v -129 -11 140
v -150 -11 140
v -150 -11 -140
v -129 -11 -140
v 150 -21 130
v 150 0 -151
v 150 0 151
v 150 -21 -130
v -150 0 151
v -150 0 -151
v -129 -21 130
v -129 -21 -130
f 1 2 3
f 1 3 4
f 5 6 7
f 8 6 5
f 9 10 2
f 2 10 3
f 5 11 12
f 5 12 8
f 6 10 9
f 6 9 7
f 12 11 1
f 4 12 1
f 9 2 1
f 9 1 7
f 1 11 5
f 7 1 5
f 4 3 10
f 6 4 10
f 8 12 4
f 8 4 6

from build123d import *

# Parameters (mm, degrees)
F0_W     = 300
F0_H     = 302
F1_DEPTH = 21
F2_SIZE  = 20.99999
F3_W     = 21
F3_H     = 302
F4_DEPTH = 10


# Not quite as in the source:
# - a fillet or chamfer is up to 0.001 mm smaller than in the source, because OpenCascade refuses the exact size


with BuildPart() as f1:
    # F0 (on Front) → F1 (new body)
    with BuildSketch(Plane.XZ):
        Rectangle(F0_W, F0_H)
    extrude(amount=F1_DEPTH)

    # F2 (size 21 in the source; OpenCascade refuses exactly that, so slightly less here)
    f2_edges = [f1.edges().sort_by_distance(p)[0] for p in [
        (0, -21, 151),
        (0, -21, -151),
    ]]
    chamfer(f2_edges, length=F2_SIZE)

    # F3 (on face) → F4 (cut)
    with BuildSketch(Plane.XZ.offset(21)):
        with Locations((-139.5, 0)):
            Rectangle(F3_W, F3_H)
    extrude(amount=-F4_DEPTH, mode=Mode.SUBTRACT)


solid = f1.part
